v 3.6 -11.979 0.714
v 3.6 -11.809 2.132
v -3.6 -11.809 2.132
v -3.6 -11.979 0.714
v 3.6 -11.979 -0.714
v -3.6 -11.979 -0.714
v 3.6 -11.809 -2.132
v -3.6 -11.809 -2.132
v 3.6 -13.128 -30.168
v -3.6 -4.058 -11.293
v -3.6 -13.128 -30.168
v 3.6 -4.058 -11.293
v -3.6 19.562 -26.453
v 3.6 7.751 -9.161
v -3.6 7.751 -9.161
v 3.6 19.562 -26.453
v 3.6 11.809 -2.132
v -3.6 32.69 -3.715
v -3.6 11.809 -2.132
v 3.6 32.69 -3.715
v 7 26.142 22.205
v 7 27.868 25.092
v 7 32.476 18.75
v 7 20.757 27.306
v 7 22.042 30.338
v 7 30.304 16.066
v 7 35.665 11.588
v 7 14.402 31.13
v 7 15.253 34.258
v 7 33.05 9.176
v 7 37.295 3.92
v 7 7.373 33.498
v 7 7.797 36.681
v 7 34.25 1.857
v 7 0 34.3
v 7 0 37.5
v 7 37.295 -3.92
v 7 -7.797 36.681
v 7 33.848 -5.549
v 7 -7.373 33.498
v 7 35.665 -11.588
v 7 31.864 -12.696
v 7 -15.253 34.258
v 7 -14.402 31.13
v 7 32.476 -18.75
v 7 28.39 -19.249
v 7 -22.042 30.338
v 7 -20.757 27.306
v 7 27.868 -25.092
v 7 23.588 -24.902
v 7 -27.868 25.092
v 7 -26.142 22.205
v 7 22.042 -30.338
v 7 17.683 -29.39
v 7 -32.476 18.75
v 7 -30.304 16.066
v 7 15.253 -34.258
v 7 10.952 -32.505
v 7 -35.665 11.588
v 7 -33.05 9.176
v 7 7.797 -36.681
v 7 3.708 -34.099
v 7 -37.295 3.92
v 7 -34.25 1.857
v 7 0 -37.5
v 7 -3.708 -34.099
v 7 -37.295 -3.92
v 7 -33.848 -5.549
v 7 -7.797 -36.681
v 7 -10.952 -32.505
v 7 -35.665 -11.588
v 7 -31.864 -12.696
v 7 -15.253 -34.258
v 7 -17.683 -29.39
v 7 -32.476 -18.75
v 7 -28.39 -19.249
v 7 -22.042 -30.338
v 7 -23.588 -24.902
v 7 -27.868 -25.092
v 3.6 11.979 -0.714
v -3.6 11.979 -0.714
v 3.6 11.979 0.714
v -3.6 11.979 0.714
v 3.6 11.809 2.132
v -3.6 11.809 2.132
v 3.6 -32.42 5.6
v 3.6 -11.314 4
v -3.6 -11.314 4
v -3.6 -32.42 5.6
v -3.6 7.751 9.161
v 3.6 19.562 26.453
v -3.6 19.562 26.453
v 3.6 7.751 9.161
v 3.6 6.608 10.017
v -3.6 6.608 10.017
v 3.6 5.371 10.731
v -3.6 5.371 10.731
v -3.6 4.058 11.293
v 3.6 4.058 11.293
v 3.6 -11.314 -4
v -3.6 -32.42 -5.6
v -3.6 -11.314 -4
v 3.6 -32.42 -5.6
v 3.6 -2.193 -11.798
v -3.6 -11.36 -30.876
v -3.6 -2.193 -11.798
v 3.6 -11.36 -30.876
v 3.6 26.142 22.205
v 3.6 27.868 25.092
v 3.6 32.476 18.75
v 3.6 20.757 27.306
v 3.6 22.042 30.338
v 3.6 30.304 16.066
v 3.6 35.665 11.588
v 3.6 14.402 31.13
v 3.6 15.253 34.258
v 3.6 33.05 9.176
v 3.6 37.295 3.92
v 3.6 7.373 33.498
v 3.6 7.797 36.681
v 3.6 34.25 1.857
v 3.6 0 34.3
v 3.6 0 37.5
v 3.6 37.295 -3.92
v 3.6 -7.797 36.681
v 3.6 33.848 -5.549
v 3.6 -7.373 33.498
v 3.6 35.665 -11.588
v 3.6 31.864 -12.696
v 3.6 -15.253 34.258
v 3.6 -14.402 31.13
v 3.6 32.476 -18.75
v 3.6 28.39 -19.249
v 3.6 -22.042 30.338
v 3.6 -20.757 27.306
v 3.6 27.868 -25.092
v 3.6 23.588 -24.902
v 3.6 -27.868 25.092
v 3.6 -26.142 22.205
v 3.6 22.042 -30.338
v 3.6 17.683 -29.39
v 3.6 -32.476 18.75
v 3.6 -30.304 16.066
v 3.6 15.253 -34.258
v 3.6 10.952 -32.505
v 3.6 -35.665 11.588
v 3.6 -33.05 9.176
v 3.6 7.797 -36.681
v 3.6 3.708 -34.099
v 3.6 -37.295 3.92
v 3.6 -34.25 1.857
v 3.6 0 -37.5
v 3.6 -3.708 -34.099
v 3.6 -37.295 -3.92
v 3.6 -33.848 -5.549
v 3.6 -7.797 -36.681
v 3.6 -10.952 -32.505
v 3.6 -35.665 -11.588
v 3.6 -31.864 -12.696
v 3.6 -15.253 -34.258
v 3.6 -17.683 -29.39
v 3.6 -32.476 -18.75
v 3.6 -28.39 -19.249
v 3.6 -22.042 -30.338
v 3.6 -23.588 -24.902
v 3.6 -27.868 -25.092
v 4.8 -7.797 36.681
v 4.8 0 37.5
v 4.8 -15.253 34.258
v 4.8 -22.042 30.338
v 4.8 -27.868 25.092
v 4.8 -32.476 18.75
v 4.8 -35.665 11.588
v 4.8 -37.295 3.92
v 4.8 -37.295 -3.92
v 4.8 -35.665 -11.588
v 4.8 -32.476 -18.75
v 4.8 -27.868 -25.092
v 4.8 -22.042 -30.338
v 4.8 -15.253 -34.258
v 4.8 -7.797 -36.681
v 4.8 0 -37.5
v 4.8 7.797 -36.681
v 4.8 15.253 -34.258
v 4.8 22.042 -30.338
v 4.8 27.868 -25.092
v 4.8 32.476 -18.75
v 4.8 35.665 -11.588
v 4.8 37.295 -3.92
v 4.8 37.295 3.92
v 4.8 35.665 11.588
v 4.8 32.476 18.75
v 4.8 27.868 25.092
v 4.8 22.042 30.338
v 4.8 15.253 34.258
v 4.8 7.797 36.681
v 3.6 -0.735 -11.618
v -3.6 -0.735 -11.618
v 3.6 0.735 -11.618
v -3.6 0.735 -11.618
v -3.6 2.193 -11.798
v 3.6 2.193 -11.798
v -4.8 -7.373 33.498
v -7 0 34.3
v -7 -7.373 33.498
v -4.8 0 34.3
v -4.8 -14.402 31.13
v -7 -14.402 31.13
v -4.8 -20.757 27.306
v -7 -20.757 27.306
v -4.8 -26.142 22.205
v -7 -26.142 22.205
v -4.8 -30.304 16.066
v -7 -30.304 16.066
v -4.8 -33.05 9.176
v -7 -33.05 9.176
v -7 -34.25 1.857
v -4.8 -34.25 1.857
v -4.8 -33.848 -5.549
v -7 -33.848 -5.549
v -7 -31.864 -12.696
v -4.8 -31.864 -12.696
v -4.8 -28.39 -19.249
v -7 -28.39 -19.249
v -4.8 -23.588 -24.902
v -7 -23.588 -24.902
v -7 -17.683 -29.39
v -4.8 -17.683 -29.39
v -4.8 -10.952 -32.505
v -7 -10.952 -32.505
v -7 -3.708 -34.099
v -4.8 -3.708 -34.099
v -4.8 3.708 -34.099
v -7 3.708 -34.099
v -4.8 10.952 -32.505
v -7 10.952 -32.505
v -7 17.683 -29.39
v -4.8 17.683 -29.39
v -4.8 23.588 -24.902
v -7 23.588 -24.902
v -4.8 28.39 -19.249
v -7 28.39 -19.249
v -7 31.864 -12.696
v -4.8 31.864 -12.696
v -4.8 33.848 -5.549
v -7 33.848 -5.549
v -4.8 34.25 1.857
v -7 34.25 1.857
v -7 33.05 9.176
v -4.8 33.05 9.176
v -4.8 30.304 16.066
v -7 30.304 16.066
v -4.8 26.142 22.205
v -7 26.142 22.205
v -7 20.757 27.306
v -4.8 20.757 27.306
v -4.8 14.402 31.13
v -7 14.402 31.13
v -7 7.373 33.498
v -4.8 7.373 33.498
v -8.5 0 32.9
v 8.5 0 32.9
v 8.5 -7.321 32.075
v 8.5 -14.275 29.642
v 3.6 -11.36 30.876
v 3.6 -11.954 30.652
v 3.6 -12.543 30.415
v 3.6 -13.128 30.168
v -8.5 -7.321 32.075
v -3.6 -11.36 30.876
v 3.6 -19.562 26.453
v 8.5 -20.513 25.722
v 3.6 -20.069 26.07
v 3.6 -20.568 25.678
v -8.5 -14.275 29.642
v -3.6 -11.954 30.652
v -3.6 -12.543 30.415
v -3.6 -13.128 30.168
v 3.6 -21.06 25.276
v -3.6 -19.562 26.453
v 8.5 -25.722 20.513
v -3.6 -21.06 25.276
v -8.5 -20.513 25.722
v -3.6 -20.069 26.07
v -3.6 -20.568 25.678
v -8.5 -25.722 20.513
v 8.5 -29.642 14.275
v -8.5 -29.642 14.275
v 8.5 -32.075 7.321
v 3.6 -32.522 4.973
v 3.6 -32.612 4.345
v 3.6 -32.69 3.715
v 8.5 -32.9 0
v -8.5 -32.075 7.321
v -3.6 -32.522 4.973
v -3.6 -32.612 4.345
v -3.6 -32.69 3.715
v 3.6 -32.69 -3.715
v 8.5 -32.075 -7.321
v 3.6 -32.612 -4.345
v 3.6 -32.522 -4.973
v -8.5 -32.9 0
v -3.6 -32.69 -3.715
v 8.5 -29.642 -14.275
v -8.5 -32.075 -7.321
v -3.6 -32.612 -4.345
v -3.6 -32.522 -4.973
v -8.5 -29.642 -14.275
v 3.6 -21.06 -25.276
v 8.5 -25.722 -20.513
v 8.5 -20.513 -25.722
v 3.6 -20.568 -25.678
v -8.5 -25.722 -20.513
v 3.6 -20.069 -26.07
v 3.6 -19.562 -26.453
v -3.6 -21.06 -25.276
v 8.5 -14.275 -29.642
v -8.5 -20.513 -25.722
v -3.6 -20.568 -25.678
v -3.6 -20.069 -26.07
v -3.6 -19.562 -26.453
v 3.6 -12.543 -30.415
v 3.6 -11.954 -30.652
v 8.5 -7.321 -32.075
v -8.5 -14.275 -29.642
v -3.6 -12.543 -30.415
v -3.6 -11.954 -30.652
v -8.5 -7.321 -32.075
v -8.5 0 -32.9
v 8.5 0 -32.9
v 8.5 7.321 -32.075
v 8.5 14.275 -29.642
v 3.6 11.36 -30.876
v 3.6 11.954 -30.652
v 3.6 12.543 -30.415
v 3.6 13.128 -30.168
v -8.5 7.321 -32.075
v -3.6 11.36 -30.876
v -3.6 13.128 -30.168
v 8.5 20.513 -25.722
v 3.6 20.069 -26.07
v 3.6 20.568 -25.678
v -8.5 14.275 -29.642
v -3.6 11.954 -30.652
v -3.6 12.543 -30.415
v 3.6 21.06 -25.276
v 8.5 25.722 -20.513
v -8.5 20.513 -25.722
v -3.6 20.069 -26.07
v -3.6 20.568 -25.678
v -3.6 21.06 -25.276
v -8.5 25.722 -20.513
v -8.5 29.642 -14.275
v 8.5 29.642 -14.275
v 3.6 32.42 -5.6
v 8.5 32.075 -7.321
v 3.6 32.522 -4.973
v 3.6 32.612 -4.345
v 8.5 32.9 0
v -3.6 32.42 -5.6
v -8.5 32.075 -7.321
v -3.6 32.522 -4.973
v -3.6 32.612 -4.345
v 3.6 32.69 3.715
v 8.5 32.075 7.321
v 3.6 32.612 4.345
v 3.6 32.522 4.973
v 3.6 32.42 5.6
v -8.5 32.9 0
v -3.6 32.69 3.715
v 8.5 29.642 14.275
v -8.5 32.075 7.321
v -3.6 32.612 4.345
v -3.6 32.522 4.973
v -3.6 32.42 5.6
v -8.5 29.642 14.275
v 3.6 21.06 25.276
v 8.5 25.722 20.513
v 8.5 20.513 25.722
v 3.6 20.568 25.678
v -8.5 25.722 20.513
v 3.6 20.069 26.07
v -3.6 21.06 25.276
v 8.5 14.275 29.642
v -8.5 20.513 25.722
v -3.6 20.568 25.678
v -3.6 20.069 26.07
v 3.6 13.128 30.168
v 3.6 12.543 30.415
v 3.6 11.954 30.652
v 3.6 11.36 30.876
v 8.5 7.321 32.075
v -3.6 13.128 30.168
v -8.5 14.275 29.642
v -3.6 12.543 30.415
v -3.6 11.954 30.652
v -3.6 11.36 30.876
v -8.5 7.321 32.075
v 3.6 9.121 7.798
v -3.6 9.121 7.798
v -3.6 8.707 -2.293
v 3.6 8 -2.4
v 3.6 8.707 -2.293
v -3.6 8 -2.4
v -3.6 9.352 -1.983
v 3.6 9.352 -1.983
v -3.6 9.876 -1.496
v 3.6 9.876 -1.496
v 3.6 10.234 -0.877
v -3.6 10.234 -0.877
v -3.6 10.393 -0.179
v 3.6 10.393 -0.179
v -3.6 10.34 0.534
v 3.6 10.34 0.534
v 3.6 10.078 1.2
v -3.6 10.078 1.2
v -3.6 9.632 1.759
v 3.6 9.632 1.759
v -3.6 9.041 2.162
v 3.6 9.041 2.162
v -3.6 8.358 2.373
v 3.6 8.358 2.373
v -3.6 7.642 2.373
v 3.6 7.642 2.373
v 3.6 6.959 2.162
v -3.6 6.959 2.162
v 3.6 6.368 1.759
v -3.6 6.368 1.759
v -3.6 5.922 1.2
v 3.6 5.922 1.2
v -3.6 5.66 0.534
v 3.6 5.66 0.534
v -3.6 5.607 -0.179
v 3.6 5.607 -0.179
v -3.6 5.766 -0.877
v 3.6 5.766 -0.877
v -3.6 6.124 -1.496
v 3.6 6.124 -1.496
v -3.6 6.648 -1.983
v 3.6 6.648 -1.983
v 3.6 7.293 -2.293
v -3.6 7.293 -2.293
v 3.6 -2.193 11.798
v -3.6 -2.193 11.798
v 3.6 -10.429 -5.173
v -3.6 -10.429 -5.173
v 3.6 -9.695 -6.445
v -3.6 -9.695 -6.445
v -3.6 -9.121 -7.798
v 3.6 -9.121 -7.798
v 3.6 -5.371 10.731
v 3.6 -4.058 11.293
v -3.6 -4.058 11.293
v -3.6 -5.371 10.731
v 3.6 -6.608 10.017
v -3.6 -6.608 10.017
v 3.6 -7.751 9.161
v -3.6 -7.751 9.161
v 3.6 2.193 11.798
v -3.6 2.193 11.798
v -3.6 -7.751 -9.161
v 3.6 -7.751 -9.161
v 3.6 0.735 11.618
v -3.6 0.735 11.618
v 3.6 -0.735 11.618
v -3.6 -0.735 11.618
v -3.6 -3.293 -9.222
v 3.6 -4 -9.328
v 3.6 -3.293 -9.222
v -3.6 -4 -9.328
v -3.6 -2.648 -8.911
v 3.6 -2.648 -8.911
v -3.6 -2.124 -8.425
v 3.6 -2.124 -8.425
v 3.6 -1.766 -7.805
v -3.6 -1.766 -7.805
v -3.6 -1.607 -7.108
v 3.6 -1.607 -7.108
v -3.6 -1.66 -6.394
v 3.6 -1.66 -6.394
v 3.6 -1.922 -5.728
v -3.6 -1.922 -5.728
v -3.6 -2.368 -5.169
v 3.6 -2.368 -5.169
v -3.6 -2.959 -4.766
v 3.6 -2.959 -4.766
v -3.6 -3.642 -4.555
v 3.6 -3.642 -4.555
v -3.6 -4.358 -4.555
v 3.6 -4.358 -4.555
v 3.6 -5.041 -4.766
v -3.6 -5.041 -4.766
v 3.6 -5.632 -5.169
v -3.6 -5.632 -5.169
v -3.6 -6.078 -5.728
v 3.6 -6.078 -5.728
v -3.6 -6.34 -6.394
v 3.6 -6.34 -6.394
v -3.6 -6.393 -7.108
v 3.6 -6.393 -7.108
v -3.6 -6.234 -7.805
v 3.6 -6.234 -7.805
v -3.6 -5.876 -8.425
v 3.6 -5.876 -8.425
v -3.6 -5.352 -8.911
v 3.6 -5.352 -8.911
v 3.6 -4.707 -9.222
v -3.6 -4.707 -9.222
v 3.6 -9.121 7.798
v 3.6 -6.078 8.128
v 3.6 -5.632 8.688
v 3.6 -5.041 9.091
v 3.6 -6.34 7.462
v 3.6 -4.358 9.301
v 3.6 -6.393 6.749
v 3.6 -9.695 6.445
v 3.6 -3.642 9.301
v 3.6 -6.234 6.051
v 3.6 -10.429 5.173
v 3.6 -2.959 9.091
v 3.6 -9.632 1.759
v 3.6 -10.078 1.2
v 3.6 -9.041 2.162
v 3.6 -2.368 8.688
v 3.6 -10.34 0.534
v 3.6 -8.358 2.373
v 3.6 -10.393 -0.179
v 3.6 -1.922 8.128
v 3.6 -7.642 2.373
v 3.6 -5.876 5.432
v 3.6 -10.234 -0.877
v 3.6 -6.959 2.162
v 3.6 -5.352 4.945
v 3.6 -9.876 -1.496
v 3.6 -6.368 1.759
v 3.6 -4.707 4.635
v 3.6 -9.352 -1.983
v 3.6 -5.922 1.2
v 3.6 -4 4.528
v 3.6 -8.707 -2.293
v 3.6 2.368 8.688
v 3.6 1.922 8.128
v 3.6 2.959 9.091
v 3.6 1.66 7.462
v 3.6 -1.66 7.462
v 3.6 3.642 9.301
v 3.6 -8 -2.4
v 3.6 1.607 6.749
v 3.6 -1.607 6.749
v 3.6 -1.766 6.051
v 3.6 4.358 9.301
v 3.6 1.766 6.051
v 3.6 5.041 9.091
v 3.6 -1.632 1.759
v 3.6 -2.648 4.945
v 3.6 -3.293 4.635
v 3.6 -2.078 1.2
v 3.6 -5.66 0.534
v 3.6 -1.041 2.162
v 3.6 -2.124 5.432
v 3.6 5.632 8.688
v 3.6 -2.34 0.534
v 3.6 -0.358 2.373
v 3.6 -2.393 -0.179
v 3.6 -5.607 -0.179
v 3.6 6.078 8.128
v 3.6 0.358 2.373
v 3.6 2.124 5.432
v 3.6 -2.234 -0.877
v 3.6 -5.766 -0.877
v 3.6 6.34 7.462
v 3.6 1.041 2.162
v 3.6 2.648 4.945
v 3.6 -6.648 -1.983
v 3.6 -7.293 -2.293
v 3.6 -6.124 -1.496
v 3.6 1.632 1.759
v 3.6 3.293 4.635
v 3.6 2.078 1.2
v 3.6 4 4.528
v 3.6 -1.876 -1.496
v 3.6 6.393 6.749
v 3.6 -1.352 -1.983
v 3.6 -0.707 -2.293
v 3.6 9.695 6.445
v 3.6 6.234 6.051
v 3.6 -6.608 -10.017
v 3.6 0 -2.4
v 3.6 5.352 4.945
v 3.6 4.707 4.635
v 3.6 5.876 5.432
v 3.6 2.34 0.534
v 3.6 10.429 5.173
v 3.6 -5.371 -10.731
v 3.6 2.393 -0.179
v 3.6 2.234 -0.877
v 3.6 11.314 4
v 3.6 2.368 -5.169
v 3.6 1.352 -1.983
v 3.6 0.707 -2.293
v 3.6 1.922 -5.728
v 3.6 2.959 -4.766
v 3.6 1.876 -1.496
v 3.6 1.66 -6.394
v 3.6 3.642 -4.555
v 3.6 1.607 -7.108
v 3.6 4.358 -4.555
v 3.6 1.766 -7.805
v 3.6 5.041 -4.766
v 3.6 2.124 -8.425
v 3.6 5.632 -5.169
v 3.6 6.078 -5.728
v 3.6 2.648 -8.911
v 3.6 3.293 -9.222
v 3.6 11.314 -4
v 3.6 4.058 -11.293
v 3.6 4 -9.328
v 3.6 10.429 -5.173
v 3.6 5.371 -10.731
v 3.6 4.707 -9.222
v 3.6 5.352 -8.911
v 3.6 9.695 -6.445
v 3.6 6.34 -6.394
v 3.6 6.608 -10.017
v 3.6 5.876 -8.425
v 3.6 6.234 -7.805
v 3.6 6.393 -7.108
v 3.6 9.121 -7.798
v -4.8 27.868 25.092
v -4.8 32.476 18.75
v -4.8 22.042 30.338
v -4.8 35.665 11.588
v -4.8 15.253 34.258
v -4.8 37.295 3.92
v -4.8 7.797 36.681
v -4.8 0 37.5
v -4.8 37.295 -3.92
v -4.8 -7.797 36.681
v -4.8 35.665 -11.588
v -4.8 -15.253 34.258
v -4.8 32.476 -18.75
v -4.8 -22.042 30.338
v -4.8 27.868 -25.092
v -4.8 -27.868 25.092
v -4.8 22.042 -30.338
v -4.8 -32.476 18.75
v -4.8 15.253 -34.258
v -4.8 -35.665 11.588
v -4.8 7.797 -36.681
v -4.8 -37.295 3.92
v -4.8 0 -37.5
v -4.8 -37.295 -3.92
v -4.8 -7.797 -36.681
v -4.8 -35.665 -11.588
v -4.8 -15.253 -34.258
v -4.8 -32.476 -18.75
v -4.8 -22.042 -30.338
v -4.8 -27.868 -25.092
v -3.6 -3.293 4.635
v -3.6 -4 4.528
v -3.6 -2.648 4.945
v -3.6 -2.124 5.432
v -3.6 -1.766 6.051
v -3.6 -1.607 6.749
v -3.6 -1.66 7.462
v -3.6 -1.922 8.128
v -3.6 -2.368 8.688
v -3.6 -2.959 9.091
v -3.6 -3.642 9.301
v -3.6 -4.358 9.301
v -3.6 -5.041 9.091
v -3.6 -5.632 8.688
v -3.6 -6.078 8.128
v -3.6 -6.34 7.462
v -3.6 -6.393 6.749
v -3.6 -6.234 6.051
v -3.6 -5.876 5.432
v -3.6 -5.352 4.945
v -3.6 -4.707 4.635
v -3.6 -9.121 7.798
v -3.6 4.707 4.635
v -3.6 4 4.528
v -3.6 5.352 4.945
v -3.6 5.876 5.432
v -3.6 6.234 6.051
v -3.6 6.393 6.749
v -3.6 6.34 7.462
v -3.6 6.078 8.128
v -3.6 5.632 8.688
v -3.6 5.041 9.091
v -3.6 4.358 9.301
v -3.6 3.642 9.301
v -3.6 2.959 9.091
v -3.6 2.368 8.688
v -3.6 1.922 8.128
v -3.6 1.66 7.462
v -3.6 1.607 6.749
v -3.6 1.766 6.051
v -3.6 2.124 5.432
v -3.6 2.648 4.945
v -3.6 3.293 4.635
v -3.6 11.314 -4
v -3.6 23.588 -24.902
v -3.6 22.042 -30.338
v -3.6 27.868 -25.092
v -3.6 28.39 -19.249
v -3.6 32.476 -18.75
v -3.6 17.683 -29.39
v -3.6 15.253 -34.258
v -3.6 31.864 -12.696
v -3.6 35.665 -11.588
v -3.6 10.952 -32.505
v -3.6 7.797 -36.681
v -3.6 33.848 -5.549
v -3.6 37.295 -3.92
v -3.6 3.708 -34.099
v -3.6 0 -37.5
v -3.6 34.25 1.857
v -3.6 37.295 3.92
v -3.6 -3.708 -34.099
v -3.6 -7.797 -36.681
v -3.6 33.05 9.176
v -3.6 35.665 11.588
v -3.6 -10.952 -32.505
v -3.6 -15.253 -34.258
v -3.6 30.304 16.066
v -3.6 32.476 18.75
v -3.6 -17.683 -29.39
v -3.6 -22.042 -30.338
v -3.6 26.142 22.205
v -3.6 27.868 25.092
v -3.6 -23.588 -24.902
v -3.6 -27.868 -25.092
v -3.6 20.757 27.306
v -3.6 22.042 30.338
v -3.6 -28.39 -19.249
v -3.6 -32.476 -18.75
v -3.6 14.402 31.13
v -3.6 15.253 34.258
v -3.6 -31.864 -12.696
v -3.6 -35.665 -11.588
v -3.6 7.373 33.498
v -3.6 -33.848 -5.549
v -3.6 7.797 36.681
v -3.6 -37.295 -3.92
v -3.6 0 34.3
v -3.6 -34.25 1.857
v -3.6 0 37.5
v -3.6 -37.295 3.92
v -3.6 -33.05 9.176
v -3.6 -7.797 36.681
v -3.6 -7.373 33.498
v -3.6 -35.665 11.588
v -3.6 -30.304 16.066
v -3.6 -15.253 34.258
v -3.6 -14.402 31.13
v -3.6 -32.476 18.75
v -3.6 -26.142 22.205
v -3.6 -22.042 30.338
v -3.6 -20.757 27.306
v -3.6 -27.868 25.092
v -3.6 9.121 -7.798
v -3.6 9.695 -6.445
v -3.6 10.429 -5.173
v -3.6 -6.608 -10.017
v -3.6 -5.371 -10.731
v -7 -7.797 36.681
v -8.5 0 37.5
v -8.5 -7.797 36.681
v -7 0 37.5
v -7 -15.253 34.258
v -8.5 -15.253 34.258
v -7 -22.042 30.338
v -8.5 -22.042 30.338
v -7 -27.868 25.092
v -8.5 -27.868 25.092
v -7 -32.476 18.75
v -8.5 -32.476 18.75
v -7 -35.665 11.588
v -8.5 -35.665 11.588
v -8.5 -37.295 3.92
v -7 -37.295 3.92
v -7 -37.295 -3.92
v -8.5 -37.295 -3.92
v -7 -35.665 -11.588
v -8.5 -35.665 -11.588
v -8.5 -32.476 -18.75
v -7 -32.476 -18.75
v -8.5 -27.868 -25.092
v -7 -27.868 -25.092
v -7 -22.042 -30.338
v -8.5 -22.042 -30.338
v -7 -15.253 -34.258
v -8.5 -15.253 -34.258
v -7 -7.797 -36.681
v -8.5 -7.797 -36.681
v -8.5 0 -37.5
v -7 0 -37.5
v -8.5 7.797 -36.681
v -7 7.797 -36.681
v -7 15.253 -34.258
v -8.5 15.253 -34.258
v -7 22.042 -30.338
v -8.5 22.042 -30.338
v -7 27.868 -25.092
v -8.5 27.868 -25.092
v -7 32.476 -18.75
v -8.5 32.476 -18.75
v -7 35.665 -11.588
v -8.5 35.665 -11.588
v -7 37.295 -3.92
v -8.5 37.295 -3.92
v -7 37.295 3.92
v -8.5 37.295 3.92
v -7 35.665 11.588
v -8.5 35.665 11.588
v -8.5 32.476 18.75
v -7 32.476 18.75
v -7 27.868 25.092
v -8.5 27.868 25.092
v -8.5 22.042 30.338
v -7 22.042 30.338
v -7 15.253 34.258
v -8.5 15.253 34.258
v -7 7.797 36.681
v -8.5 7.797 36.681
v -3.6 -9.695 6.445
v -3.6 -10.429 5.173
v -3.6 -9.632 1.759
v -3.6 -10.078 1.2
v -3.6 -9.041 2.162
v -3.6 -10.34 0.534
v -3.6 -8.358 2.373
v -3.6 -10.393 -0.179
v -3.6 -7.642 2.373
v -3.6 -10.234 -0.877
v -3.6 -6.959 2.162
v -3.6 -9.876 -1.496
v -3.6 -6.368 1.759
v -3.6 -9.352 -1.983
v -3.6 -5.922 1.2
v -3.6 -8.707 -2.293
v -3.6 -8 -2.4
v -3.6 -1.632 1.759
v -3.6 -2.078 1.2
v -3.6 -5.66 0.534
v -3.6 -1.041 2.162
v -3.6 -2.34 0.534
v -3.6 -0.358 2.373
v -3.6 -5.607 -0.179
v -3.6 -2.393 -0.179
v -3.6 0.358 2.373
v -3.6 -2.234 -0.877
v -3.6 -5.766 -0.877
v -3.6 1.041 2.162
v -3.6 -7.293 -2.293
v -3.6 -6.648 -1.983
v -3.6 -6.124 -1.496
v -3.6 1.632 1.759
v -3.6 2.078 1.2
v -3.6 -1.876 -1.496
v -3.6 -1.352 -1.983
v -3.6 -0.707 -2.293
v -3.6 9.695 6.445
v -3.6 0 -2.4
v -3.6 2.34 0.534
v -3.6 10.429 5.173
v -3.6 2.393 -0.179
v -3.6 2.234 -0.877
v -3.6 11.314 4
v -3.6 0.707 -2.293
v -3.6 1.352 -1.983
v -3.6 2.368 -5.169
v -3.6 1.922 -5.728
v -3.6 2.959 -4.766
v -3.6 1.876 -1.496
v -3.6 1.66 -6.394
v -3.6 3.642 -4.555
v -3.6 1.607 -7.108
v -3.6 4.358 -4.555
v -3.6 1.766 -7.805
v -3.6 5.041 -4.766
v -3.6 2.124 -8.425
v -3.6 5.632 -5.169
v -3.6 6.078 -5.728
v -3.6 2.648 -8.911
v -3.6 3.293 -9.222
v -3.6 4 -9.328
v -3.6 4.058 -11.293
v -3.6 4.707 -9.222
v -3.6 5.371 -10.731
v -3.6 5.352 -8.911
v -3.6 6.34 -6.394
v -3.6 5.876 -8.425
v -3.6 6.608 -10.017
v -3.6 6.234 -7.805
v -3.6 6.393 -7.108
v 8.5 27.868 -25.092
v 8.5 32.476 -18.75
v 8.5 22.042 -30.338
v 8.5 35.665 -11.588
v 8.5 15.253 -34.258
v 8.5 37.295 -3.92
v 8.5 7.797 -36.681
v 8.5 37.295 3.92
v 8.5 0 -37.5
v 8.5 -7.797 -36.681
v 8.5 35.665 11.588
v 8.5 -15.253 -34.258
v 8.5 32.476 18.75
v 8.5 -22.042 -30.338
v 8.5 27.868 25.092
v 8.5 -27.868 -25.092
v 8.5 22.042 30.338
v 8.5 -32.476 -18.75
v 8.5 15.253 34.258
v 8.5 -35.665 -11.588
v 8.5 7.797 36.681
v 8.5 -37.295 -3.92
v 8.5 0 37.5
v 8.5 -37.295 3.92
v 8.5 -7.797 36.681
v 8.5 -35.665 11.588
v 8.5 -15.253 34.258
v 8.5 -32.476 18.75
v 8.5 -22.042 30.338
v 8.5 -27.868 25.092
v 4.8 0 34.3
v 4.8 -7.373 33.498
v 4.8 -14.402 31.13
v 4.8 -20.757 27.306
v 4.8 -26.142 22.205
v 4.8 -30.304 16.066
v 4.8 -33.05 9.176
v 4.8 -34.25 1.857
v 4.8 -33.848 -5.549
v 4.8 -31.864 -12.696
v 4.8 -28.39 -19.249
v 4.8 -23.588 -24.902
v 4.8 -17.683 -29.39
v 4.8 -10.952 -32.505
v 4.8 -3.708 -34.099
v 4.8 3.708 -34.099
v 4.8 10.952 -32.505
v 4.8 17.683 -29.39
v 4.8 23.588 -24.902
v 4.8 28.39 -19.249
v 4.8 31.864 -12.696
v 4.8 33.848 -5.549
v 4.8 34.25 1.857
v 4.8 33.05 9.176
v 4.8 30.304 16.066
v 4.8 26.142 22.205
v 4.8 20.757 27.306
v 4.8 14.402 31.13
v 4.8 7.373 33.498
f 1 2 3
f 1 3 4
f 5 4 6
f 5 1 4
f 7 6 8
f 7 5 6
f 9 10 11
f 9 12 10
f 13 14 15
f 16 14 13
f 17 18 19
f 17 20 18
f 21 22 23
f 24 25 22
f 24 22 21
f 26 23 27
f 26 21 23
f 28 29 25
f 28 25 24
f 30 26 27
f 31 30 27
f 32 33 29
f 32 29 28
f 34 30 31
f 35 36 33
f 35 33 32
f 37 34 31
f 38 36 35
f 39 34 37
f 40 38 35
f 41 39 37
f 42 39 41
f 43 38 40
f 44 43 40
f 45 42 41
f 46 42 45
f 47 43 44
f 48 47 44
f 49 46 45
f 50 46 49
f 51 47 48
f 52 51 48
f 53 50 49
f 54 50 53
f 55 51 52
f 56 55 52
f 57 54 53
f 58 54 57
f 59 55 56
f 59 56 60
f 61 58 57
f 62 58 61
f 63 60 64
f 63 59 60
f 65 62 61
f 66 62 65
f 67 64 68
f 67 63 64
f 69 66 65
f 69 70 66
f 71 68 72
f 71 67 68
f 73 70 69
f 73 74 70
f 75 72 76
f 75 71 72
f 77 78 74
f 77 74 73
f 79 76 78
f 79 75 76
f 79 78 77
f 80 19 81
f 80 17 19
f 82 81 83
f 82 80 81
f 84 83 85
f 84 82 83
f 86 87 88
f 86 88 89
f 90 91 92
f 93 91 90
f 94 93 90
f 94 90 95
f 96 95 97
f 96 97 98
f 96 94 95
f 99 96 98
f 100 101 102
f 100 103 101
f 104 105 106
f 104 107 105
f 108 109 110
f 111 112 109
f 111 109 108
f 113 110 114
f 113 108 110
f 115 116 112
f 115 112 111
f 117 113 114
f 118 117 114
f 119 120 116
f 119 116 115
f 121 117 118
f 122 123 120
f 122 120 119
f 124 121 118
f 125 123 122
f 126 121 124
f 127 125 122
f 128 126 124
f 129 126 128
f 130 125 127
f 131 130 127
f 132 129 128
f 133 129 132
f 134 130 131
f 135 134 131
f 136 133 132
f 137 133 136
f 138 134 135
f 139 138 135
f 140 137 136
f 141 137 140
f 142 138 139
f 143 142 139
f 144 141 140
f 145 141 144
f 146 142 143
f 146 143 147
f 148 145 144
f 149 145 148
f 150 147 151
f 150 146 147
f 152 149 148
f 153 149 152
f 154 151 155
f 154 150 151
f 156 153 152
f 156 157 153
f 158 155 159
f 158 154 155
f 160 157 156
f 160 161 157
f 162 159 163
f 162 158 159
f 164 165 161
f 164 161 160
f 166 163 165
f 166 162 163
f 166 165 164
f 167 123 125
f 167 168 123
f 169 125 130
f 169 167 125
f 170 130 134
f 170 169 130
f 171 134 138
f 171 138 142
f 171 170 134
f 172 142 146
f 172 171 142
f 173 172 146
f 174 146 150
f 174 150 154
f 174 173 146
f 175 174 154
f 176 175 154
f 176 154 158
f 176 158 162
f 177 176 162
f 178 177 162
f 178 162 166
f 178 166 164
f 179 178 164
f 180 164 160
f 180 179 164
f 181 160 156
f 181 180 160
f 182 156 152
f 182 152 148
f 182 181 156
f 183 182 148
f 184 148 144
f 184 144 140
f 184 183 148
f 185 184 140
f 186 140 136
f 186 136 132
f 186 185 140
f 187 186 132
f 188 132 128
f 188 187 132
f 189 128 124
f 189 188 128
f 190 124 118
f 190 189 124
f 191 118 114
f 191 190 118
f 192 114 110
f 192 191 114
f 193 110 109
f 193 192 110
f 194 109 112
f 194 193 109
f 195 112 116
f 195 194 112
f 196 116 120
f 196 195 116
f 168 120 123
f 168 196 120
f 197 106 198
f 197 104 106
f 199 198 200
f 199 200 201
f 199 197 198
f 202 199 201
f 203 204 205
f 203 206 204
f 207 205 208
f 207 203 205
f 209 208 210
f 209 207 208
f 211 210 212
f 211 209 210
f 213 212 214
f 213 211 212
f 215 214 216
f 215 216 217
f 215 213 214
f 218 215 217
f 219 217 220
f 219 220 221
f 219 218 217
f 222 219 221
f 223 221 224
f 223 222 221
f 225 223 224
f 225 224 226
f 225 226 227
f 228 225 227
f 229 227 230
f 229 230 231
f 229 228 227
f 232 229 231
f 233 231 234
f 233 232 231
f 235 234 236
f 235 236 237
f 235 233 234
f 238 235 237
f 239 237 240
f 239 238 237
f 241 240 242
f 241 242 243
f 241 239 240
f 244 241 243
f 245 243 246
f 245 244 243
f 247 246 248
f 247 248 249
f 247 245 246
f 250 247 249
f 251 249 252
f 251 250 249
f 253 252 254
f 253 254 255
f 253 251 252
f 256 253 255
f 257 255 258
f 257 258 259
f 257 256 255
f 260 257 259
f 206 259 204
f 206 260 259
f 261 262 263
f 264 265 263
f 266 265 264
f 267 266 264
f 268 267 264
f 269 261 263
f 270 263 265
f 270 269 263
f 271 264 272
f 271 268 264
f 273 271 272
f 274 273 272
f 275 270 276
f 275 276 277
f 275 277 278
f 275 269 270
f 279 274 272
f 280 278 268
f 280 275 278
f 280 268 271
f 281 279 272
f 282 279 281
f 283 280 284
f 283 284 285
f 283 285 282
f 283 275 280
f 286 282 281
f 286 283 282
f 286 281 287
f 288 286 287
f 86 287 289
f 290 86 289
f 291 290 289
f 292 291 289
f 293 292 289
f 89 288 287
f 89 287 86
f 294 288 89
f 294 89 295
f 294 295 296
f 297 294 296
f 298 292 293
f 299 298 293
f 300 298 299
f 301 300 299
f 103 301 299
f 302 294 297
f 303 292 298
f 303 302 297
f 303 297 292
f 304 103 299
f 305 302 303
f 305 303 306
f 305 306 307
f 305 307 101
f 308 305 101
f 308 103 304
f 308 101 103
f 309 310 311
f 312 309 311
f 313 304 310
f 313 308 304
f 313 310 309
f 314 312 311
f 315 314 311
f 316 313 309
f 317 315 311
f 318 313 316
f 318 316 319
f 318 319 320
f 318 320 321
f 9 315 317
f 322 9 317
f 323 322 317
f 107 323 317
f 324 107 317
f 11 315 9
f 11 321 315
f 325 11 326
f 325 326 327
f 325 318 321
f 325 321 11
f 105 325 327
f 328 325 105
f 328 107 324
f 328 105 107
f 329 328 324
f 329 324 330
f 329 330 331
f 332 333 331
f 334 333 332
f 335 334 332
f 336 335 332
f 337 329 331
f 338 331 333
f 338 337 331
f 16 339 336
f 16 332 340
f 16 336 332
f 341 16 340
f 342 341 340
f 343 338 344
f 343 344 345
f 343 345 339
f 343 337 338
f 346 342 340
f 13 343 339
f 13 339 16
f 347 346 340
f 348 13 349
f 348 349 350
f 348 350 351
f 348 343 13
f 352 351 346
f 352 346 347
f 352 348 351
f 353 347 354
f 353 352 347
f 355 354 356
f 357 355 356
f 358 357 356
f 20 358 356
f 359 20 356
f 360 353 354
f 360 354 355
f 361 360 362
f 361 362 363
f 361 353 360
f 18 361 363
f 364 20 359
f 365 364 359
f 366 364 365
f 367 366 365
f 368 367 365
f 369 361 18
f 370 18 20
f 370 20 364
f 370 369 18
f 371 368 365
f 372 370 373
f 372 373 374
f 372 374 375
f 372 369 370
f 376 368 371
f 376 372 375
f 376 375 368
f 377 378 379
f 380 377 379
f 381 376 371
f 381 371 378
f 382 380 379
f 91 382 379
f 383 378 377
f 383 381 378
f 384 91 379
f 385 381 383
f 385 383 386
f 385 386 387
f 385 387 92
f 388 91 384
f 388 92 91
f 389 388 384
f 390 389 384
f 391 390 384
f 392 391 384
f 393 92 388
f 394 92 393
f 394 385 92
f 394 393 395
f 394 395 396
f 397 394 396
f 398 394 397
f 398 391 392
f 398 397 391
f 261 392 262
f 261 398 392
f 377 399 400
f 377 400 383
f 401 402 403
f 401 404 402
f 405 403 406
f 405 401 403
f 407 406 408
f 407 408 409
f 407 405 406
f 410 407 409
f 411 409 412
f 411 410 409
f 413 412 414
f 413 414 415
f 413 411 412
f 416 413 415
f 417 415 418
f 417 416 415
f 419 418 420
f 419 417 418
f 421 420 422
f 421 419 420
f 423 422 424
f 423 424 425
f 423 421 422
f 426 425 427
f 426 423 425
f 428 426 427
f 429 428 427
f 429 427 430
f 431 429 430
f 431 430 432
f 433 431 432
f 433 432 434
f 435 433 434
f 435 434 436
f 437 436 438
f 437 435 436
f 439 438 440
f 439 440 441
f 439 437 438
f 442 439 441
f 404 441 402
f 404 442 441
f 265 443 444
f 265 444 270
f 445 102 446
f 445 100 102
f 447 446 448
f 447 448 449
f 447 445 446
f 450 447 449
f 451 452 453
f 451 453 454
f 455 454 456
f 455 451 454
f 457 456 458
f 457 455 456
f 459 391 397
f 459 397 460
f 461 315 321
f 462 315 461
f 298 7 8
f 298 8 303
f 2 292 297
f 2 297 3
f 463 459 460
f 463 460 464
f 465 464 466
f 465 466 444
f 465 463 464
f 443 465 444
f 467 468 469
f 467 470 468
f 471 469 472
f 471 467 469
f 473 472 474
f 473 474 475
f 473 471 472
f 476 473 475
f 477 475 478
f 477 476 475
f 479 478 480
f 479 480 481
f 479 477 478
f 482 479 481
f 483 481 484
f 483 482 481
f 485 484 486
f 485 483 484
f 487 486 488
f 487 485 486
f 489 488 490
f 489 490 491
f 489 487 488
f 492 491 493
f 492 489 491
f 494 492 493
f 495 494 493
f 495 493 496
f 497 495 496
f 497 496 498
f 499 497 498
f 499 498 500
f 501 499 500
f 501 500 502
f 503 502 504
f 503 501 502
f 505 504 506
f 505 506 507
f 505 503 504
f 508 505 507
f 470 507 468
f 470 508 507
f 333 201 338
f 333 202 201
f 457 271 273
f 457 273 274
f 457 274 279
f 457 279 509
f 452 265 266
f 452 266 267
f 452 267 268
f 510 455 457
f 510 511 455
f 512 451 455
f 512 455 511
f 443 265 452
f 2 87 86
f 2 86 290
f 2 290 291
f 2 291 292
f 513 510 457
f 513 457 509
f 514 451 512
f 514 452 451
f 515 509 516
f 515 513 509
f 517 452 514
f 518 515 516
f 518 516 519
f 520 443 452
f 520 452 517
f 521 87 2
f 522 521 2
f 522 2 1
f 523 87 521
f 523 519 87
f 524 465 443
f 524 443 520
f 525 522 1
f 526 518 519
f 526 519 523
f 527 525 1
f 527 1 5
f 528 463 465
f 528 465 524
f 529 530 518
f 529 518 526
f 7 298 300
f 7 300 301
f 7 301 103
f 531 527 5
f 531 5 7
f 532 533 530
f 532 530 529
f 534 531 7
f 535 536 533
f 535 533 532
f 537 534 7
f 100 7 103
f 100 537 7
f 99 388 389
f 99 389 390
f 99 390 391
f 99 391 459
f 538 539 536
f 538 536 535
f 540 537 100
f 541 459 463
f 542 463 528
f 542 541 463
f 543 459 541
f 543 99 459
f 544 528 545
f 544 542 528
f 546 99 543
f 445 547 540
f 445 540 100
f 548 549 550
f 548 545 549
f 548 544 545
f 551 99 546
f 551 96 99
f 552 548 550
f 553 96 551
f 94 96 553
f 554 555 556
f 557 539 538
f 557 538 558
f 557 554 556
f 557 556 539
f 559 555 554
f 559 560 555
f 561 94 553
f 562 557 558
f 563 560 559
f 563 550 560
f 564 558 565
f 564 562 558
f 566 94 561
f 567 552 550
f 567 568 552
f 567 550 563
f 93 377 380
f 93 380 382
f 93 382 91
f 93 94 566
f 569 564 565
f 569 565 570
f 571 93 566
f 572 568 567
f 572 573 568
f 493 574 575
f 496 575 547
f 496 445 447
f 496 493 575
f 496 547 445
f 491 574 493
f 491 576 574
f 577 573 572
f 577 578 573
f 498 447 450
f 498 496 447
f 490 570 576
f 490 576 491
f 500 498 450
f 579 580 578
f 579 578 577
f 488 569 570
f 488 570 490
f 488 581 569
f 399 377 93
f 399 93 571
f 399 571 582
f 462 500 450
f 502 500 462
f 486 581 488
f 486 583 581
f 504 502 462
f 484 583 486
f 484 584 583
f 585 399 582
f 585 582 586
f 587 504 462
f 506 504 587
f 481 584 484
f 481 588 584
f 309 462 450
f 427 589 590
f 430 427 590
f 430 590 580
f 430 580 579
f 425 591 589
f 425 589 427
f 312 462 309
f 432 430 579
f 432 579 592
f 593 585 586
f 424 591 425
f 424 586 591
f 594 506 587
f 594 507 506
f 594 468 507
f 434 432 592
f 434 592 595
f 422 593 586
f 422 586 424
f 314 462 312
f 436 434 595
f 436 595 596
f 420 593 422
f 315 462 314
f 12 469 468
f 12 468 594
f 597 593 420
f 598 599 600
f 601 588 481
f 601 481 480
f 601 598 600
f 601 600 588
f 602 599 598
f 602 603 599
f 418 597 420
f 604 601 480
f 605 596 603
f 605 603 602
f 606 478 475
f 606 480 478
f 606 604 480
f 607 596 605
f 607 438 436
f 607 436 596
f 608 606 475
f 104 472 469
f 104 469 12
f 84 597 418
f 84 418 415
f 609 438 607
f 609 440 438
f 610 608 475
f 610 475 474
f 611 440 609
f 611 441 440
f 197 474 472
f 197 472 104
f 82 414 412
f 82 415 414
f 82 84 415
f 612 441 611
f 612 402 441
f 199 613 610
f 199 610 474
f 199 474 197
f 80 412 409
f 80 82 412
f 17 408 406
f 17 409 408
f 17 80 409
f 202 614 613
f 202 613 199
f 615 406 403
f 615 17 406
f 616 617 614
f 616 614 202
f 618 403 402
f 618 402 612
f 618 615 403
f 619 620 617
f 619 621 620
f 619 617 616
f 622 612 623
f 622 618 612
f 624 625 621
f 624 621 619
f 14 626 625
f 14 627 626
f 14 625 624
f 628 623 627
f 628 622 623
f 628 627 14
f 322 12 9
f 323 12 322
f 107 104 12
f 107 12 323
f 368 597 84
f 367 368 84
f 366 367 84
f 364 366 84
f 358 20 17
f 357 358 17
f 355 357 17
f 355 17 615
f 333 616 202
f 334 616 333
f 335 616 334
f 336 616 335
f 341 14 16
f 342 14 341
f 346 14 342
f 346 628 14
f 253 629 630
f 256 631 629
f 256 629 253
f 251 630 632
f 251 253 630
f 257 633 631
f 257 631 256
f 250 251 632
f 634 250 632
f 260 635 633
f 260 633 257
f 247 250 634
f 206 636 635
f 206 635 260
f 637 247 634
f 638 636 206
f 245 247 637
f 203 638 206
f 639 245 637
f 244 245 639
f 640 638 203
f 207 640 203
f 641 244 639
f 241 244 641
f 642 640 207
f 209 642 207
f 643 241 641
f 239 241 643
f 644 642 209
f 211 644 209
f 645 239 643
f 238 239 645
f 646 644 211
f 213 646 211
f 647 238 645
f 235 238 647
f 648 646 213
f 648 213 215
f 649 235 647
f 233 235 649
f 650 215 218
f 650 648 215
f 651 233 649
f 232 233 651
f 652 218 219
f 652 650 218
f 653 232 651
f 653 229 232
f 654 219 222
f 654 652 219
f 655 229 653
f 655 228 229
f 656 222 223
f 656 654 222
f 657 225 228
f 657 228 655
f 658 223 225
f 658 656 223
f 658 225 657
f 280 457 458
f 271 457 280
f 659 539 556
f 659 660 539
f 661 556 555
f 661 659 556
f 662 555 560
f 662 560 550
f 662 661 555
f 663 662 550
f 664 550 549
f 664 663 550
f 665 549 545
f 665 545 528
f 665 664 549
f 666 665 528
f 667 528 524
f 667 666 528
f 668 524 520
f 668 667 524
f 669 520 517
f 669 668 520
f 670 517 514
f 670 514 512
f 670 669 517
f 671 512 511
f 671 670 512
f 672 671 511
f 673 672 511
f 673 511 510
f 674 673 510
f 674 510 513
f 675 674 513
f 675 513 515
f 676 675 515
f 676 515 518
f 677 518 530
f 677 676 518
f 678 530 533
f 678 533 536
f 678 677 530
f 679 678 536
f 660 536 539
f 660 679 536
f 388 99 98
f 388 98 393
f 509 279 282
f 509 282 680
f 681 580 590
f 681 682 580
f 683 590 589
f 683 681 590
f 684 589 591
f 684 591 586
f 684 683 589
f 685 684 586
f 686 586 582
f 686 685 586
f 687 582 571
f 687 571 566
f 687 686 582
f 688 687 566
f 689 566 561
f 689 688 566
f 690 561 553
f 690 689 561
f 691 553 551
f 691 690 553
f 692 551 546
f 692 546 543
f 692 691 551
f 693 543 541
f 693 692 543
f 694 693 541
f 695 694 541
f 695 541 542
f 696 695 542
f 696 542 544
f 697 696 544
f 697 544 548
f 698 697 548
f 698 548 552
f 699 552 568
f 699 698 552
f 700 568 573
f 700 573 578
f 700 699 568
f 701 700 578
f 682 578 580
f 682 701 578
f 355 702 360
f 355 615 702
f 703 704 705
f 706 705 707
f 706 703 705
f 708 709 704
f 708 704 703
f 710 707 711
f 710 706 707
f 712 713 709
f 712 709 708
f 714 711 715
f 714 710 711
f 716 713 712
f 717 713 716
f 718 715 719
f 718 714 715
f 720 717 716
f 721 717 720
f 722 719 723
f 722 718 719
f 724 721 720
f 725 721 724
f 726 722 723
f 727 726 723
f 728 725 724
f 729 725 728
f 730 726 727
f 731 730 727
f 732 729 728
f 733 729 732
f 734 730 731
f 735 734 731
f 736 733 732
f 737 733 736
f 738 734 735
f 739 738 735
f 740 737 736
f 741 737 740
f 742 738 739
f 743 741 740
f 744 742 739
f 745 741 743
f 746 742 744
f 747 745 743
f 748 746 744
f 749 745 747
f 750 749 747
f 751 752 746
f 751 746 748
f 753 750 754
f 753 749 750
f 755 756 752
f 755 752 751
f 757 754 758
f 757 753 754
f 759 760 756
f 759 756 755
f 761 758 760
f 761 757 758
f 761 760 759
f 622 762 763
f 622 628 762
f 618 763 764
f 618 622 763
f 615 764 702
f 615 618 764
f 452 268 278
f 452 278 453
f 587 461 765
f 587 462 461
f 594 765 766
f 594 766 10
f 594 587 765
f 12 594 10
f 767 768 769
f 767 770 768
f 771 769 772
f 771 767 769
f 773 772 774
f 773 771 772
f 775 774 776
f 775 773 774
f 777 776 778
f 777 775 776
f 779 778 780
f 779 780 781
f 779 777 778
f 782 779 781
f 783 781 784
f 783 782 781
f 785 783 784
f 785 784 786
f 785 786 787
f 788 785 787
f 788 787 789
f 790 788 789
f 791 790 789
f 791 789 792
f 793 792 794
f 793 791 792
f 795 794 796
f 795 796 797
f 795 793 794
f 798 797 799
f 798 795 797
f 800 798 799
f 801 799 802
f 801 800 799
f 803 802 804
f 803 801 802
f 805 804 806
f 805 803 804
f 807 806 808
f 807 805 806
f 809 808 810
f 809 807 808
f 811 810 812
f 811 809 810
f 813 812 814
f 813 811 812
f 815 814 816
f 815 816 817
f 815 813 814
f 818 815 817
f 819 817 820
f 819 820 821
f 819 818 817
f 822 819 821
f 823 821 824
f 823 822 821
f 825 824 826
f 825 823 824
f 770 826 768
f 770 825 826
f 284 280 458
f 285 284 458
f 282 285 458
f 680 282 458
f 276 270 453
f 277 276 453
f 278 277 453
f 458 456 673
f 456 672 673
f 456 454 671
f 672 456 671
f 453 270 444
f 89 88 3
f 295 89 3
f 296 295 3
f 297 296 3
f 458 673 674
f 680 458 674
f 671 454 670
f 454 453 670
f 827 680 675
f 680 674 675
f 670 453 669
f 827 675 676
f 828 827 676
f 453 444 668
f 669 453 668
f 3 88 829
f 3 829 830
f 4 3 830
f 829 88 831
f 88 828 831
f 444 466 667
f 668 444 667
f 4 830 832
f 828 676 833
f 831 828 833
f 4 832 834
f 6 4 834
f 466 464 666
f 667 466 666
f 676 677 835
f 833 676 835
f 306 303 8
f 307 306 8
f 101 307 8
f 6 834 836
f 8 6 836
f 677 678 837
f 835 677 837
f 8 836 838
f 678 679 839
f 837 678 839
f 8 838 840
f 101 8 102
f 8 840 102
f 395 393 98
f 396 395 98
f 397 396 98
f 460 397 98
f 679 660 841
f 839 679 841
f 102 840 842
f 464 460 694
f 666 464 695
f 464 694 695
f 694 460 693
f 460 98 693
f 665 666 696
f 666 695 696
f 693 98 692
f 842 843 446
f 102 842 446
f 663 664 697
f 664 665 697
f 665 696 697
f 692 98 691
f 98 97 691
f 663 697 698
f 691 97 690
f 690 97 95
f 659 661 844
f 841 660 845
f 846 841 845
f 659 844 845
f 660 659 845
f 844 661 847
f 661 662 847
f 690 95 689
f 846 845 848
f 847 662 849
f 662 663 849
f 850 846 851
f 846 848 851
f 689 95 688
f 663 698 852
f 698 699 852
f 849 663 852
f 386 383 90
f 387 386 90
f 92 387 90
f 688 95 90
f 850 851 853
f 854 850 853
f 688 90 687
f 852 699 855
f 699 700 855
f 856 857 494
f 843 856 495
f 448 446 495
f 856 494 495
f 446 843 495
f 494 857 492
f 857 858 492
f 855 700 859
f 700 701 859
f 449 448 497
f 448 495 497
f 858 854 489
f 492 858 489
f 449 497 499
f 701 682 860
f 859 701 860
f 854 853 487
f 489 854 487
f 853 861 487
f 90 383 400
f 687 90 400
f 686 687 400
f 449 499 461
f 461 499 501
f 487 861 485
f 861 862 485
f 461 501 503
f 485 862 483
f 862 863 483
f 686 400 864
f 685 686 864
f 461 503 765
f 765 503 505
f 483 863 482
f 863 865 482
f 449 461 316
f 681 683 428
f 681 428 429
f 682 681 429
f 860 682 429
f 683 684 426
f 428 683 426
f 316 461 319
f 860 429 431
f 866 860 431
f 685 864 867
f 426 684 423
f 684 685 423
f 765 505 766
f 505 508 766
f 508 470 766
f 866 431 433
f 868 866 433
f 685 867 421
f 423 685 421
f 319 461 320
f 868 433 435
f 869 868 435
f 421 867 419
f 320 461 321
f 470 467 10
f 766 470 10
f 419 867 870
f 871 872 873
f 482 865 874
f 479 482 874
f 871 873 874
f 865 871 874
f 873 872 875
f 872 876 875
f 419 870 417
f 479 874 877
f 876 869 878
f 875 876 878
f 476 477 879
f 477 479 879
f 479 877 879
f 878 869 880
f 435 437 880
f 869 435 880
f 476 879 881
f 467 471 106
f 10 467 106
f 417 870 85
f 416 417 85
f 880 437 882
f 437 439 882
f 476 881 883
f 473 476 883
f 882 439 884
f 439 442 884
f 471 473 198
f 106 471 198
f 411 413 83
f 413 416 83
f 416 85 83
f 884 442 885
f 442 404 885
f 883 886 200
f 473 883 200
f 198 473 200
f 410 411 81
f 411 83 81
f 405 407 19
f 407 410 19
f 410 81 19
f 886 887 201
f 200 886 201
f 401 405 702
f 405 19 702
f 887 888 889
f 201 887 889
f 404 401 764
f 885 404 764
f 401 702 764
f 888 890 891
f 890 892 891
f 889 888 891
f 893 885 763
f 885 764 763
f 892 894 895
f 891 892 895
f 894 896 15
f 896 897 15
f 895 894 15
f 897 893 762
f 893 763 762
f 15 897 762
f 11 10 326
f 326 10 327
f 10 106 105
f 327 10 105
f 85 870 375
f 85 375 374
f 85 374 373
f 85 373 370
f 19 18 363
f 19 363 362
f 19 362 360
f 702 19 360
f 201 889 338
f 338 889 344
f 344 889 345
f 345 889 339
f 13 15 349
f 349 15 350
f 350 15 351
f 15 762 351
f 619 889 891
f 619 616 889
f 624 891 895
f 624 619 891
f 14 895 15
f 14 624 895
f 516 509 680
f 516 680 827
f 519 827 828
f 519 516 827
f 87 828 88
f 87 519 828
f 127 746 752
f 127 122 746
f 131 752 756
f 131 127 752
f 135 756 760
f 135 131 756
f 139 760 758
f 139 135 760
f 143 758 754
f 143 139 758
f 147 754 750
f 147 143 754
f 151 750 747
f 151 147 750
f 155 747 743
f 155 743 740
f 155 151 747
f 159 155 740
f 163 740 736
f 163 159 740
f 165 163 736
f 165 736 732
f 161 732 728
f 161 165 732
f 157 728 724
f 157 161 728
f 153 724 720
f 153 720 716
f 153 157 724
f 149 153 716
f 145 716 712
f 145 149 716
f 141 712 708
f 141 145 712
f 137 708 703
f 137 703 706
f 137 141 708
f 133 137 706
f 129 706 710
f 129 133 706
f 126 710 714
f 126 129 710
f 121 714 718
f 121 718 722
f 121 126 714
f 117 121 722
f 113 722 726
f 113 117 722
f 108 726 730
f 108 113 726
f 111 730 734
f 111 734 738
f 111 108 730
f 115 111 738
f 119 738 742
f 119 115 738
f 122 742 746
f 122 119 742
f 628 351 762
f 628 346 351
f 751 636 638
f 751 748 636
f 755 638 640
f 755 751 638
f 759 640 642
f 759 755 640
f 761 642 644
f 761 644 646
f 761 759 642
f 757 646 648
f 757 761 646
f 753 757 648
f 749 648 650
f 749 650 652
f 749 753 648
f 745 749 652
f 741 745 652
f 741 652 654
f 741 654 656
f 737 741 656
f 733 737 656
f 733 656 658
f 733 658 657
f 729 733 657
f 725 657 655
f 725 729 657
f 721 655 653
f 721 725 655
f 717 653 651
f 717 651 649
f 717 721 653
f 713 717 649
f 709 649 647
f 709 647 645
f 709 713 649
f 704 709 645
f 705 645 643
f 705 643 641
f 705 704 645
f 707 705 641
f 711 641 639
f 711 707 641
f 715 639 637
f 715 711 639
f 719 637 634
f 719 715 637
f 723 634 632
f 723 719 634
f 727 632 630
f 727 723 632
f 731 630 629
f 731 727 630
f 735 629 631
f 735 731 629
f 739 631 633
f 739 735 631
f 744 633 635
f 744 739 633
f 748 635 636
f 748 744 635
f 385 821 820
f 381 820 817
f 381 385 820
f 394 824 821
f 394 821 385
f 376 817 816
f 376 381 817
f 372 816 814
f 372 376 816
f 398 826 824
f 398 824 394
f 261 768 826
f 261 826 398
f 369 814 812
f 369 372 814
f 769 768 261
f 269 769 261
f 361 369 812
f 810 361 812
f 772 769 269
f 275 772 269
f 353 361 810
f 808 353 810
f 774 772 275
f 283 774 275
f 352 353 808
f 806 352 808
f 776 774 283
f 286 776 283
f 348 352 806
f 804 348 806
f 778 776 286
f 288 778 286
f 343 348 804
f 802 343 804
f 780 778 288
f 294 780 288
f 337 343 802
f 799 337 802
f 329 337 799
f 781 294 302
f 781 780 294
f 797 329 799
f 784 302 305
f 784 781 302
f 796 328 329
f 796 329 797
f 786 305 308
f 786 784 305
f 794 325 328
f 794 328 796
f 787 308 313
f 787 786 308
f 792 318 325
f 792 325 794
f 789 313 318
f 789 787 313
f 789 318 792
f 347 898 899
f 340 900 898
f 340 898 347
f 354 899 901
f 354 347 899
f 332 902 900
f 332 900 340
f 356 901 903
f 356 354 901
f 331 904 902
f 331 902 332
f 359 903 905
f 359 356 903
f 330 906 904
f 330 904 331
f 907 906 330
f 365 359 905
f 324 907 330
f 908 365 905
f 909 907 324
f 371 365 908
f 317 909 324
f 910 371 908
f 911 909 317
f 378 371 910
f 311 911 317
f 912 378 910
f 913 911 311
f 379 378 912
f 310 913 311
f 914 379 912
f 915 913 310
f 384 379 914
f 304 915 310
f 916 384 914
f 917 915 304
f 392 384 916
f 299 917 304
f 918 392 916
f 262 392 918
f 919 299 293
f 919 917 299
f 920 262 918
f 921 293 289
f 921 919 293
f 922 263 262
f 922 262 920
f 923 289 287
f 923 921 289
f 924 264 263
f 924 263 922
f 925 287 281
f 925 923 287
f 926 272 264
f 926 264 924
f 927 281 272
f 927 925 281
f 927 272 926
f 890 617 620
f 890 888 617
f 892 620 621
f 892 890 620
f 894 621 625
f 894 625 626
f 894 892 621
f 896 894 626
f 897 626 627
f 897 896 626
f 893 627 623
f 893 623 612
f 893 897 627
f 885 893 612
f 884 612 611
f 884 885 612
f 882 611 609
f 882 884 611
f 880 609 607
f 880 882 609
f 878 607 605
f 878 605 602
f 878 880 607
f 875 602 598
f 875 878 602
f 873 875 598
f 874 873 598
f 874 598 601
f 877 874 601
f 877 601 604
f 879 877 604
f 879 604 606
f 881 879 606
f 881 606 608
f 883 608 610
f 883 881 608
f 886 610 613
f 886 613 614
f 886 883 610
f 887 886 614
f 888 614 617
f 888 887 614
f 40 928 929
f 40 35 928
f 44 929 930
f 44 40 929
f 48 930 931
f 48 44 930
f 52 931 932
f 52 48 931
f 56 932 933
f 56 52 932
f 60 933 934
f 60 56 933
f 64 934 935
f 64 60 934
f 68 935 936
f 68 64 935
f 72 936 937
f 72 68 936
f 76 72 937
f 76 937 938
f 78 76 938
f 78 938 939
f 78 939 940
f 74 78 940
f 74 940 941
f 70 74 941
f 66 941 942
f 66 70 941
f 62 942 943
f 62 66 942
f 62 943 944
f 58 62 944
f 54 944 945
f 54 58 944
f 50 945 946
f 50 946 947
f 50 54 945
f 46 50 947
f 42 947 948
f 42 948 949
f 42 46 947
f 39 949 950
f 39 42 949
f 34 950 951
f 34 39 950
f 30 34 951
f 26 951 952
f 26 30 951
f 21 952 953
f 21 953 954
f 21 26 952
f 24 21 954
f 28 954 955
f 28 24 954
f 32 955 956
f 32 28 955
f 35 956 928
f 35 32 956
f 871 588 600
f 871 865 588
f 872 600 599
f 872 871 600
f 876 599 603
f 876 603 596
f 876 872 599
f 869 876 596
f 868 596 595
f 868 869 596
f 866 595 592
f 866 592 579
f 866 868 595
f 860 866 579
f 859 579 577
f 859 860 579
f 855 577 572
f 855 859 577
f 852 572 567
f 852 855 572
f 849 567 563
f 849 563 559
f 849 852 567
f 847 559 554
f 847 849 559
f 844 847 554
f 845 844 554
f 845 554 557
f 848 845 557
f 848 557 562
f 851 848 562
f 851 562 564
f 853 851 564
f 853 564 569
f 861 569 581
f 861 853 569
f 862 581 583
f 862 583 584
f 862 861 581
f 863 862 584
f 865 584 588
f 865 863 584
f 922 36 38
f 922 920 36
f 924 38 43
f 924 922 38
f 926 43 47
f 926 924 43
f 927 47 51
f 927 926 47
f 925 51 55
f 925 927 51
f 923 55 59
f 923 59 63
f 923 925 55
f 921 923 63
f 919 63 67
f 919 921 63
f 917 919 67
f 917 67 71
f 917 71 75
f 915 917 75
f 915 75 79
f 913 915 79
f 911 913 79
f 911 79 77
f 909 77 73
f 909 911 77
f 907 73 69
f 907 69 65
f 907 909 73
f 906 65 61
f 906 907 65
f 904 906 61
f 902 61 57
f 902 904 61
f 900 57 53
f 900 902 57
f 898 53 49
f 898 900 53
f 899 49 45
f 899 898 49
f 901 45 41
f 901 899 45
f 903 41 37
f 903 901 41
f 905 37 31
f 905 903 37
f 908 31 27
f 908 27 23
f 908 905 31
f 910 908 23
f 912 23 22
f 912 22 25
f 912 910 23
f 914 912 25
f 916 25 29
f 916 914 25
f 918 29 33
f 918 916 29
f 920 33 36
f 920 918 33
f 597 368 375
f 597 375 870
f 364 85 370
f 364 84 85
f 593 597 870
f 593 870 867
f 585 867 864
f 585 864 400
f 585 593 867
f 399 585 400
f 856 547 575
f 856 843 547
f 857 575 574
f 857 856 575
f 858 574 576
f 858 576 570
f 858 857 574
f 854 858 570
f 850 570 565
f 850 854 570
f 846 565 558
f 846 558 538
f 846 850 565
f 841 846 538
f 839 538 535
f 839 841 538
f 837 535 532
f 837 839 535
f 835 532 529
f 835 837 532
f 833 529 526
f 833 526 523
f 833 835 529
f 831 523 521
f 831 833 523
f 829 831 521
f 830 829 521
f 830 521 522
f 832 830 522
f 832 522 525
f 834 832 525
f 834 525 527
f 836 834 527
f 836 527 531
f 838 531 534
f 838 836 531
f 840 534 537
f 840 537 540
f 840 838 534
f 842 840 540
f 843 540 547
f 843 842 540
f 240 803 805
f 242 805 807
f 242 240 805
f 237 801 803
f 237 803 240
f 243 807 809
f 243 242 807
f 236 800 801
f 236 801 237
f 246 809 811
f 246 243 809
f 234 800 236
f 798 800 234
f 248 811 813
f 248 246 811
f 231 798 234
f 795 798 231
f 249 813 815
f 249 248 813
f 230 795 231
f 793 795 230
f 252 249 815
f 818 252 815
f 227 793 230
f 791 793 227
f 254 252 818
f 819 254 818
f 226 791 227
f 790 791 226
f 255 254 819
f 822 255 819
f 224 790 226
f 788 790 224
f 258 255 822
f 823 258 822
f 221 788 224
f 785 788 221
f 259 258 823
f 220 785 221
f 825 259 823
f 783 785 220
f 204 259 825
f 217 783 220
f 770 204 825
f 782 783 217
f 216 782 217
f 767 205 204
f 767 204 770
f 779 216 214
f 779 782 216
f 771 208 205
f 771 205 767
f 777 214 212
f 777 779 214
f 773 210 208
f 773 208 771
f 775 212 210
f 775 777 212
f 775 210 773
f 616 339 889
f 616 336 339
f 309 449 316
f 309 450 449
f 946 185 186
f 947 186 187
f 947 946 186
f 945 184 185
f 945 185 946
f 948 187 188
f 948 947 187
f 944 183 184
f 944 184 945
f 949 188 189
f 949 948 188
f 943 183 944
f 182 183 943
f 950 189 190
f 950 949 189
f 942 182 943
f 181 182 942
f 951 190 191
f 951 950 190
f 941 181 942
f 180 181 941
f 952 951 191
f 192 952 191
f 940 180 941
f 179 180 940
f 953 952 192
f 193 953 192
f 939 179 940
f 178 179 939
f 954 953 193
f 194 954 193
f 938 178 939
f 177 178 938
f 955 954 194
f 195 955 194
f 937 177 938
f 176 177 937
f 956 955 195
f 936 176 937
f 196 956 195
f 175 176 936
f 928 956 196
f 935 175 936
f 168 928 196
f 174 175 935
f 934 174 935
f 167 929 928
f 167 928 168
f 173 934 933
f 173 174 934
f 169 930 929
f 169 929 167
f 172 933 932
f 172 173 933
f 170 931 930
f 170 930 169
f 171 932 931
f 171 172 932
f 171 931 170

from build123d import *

# Parameters (mm, degrees)
SKETCH1_R           = 2.4
BOSS_EXTRUDE1_DEPTH = 3.6


with BuildPart() as part:
    # Top → Base (revolve)
    with BuildSketch(Plane(origin=(0, 0, 0), x_dir=(1, 0, 0), z_dir=(0, 1, 0)), mode=Mode.PRIVATE) as base_sk:
        Polygon((-8.5, 32.9), (-8.5, 37.5), (-7, 37.5), (-7, 34.3), (-4.8, 34.3), (-4.8, 37.5), (-3.6, 37.5), (-3.6, 34.3), (3.6, 34.3), (3.6, 37.5), (4.8, 37.5), (4.8, 34.3), (7, 34.3), (7, 37.5), (8.5, 37.5), (8.5, 32.9), align=None)
    revolve(base_sk.sketch.rotate(Axis((0, 0, 0), (1, 0, 0)), 180), axis=Axis((0, 0, 0), (1, 0, 0)))

    # Sketch1 → Boss-Extrude1 (add, symmetric)
    with BuildSketch(Plane(origin=(0, 0, 0), x_dir=(0, 0, -1), z_dir=(1, 0, 0))):
        with BuildLine():
            Line((-2.132100415, 11.809070574), (-3.714992228, 32.689582939))
            ThreePointArc((-3.714992228, 32.689582939), (-4.659447617, 32.568382642), (-5.6, 32.419901295))
            Line((-5.6, 32.419901295), (-4, 11.313708499))
            ThreePointArc((-4, 11.313708499), (-5.797958971, 10.042359518), (-7.797958971, 9.120955865))
            Line((-7.797958971, 9.120955865), (-25.27645811, 21.059692909))
            ThreePointArc((-25.27645811, 21.059692909), (-25.875322919, 20.319391325), (-26.452513151, 19.562069114))
            Line((-26.452513151, 19.562069114), (-9.160904905, 7.75098841))
            ThreePointArc((-9.160904905, 7.75098841), (-10.392304845, 6), (-11.29300532, 4.058082164))
            Line((-11.29300532, 4.058082164), (-30.167505379, 13.127513825))
            ThreePointArc((-30.167505379, 13.127513825), (-30.534770537, 12.248991317), (-30.87645811, 11.360208386))
            Line((-30.87645811, 11.360208386), (-11.797958971, 2.192752634))
            ThreePointArc((-11.797958971, 2.192752634), (-11.595917942, 0), (-11.797958971, -2.192752634))
            Line((-11.797958971, -2.192752634), (-30.87645811, -11.360208386))
            ThreePointArc((-30.87645811, -11.360208386), (-30.534770537, -12.248991317), (-30.167505379, -13.127513825))
            Line((-30.167505379, -13.127513825), (-11.29300532, -4.058082164))
            ThreePointArc((-11.29300532, -4.058082164), (-10.392304845, -6), (-9.160904905, -7.75098841))
            Line((-9.160904905, -7.75098841), (-26.452513151, -19.562069114))
            ThreePointArc((-26.452513151, -19.562069114), (-25.875322919, -20.319391325), (-25.27645811, -21.059692909))
            Line((-25.27645811, -21.059692909), (-7.797958971, -9.120955865))
            ThreePointArc((-7.797958971, -9.120955865), (-5.797958971, -10.042359518), (-4, -11.313708499))
            Line((-4, -11.313708499), (-5.6, -32.419901295))
            ThreePointArc((-5.6, -32.419901295), (-4.659447617, -32.568382642), (-3.714992228, -32.689582939))
            Line((-3.714992228, -32.689582939), (-2.132100415, -11.809070574))
            ThreePointArc((-2.132100415, -11.809070574), (0, -12), (2.132100415, -11.809070574))
            Line((2.132100415, -11.809070574), (3.714992228, -32.689582939))
            ThreePointArc((3.714992228, -32.689582939), (4.659447617, -32.568382642), (5.6, -32.419901295))
            Line((5.6, -32.419901295), (4, -11.313708499))
            ThreePointArc((4, -11.313708499), (5.797958971, -10.042359518), (7.797958971, -9.120955865))
            Line((7.797958971, -9.120955865), (25.27645811, -21.059692909))
            ThreePointArc((25.27645811, -21.059692909), (25.875322919, -20.319391325), (26.452513151, -19.562069114))
            Line((26.452513151, -19.562069114), (9.160904905, -7.75098841))
            ThreePointArc((9.160904905, -7.75098841), (10.392304845, -6), (11.29300532, -4.058082164))
            Line((11.29300532, -4.058082164), (30.167505379, -13.127513825))
            ThreePointArc((30.167505379, -13.127513825), (30.534770537, -12.248991317), (30.87645811, -11.360208386))
            Line((30.87645811, -11.360208386), (11.797958971, -2.192752634))
            ThreePointArc((11.797958971, -2.192752634), (11.595917942, 0), (11.797958971, 2.192752634))
            Line((11.797958971, 2.192752634), (30.87645811, 11.360208386))
            ThreePointArc((30.87645811, 11.360208386), (30.534770537, 12.248991317), (30.167505379, 13.127513825))
            Line((30.167505379, 13.127513825), (11.29300532, 4.058082164))
            ThreePointArc((11.29300532, 4.058082164), (10.392304845, 6), (9.160904905, 7.75098841))
            Line((9.160904905, 7.75098841), (26.452513151, 19.562069114))
            ThreePointArc((26.452513151, 19.562069114), (25.875322919, 20.319391325), (25.27645811, 21.059692909))
            Line((25.27645811, 21.059692909), (7.797958971, 9.120955865))
            ThreePointArc((7.797958971, 9.120955865), (5.797958971, 10.042359518), (4, 11.313708499))
            Line((4, 11.313708499), (5.6, 32.419901295))
            ThreePointArc((5.6, 32.419901295), (4.659447617, 32.568382642), (3.714992228, 32.689582939))
            Line((3.714992228, 32.689582939), (2.132100415, 11.809070574))
            ThreePointArc((2.132100415, 11.809070574), (0, 12), (-2.132100415, 11.809070574))
        make_face()
        with Locations((0, 8)):
            Circle(SKETCH1_R, mode=Mode.SUBTRACT)
        Circle(SKETCH1_R, mode=Mode.SUBTRACT)
        with Locations((-6.92820323, 4)):
            Circle(SKETCH1_R, mode=Mode.SUBTRACT)
        with Locations((-6.92820323, -4)):
            Circle(SKETCH1_R, mode=Mode.SUBTRACT)
        with Locations((0, -8)):
            Circle(SKETCH1_R, mode=Mode.SUBTRACT)
        with Locations((6.92820323, -4)):
            Circle(SKETCH1_R, mode=Mode.SUBTRACT)
        with Locations((6.92820323, 4)):
            Circle(SKETCH1_R, mode=Mode.SUBTRACT)
    extrude(amount=BOSS_EXTRUDE1_DEPTH, both=True)


solid = part.part
